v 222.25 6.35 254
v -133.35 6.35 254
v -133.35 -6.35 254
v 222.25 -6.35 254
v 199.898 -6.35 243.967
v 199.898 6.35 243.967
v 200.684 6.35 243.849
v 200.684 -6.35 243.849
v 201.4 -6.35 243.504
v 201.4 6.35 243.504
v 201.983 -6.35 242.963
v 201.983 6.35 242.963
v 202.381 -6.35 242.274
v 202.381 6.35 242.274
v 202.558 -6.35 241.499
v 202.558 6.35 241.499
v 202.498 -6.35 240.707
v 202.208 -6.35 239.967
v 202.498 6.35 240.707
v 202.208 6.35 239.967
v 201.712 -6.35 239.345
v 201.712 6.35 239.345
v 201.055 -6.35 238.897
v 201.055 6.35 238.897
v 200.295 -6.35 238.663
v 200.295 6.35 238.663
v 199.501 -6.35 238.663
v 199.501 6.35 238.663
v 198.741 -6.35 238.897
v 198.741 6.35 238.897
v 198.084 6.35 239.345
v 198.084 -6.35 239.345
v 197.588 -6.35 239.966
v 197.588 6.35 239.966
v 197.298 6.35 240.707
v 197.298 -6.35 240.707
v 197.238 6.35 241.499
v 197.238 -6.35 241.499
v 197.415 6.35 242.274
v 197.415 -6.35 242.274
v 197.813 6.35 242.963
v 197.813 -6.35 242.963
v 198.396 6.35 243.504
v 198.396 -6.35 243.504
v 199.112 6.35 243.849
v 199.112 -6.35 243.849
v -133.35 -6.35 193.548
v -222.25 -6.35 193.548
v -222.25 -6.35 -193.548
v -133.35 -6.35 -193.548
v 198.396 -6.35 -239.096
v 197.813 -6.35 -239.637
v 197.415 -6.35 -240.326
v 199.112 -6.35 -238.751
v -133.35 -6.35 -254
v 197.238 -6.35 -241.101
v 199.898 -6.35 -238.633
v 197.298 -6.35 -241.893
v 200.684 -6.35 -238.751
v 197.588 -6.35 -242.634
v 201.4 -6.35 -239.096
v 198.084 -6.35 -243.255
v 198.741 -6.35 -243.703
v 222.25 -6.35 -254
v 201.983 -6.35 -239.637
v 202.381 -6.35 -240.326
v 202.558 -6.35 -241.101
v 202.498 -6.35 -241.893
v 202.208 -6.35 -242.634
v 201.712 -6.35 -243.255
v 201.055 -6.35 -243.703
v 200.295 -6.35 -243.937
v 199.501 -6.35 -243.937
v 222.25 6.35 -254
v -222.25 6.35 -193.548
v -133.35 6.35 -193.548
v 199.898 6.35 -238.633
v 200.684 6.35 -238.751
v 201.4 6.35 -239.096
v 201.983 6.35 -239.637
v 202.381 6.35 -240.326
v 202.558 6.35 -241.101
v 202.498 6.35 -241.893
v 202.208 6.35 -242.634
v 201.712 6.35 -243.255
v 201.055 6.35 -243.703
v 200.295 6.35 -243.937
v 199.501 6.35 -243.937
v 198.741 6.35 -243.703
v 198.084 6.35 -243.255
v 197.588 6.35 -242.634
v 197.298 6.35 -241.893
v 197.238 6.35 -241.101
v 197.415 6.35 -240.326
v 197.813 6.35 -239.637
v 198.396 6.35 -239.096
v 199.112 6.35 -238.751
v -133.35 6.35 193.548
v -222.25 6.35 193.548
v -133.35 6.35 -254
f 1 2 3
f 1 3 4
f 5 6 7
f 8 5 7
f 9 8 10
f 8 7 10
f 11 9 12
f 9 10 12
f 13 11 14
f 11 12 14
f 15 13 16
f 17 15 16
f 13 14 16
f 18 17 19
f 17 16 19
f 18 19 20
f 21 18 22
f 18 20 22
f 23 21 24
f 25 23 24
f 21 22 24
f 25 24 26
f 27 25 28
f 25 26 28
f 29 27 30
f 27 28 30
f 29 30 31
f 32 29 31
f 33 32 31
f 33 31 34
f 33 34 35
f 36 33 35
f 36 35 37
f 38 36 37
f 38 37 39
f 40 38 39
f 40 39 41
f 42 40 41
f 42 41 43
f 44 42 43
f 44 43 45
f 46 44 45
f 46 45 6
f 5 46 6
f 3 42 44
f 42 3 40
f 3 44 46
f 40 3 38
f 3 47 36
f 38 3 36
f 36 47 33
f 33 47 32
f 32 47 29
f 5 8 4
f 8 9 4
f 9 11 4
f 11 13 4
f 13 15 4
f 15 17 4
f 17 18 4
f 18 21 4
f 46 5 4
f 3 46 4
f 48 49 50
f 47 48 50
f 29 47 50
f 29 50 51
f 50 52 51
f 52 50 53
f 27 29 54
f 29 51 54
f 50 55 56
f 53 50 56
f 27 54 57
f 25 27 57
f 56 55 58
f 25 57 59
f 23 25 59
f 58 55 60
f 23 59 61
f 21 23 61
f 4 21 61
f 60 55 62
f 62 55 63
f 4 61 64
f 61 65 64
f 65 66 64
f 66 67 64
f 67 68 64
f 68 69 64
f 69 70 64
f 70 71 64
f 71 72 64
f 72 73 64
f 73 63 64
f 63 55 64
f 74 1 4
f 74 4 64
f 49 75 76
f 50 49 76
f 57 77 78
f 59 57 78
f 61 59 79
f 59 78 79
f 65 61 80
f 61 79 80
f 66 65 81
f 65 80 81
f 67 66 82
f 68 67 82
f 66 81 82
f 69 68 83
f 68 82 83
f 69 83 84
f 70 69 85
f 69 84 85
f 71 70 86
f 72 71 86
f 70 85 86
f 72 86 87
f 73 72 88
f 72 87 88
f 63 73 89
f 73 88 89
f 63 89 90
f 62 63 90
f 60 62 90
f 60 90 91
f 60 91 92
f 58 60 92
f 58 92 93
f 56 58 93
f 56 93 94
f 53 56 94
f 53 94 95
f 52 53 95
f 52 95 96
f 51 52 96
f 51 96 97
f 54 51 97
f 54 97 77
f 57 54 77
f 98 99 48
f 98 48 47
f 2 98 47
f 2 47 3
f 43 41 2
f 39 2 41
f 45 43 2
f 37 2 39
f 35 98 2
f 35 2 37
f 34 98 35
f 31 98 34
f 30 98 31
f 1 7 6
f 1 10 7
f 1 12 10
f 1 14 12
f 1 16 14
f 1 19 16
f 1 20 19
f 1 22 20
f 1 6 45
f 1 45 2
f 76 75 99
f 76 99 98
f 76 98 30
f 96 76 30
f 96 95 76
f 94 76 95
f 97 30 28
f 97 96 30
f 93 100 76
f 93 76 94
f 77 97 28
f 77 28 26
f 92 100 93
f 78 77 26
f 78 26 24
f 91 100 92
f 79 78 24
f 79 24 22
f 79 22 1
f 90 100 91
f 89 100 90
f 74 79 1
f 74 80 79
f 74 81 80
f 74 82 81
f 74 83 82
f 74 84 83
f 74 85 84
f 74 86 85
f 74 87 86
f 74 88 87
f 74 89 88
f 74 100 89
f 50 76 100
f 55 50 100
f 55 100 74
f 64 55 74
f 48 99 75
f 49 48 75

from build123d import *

# Parameters (mm, degrees)
SKETCH1_W           = 444.5
SKETCH1_H           = 508
BOSS_EXTRUDE1_DEPTH = 6.35
SKETCH2_W           = 88.9
SKETCH2_H           = 60.452
CUT_EXTRUDE1_DEPTH  = 230.886
SKETCH3_R           = 2.667
CUT_EXTRUDE2_DEPTH  = 230.886


with BuildPart() as part:
    # Sketch1 → Boss-Extrude1 (new, symmetric)
    with BuildSketch(Plane(origin=(0, 0, 0), x_dir=(1, 0, 0), z_dir=(0, 1, 0))):
        Rectangle(SKETCH1_W, SKETCH1_H)
    extrude(amount=BOSS_EXTRUDE1_DEPTH, both=True)

    # Sketch2 → Cut-Extrude1 (cut)
    with BuildSketch(Plane(origin=(0, 6.35, 0), x_dir=(1, 0, 0), z_dir=(0, 1, 0))):
        with Locations((-177.8, 223.774)):
            Rectangle(SKETCH2_W, SKETCH2_H)
    cut_extrude1 = extrude(amount=-CUT_EXTRUDE1_DEPTH, mode=Mode.SUBTRACT)

    # Mirror1: Cut-Extrude1 across plane
    add(cut_extrude1.mirror(Plane.XY), mode=Mode.SUBTRACT)

    # Sketch3 → Cut-Extrude2 (cut)
    with BuildSketch(Plane(origin=(0, 6.35, 0), x_dir=(1, 0, 0), z_dir=(0, 1, 0))):
        with Locations(Location((199.898, -241.3, 0), (0, 0, 270))):
            Circle(SKETCH3_R)
        with Locations(Location((199.898, 241.3, 0), (0, 0, 270))):
            Circle(SKETCH3_R)
    extrude(amount=-CUT_EXTRUDE2_DEPTH, mode=Mode.SUBTRACT)


solid = part.part
